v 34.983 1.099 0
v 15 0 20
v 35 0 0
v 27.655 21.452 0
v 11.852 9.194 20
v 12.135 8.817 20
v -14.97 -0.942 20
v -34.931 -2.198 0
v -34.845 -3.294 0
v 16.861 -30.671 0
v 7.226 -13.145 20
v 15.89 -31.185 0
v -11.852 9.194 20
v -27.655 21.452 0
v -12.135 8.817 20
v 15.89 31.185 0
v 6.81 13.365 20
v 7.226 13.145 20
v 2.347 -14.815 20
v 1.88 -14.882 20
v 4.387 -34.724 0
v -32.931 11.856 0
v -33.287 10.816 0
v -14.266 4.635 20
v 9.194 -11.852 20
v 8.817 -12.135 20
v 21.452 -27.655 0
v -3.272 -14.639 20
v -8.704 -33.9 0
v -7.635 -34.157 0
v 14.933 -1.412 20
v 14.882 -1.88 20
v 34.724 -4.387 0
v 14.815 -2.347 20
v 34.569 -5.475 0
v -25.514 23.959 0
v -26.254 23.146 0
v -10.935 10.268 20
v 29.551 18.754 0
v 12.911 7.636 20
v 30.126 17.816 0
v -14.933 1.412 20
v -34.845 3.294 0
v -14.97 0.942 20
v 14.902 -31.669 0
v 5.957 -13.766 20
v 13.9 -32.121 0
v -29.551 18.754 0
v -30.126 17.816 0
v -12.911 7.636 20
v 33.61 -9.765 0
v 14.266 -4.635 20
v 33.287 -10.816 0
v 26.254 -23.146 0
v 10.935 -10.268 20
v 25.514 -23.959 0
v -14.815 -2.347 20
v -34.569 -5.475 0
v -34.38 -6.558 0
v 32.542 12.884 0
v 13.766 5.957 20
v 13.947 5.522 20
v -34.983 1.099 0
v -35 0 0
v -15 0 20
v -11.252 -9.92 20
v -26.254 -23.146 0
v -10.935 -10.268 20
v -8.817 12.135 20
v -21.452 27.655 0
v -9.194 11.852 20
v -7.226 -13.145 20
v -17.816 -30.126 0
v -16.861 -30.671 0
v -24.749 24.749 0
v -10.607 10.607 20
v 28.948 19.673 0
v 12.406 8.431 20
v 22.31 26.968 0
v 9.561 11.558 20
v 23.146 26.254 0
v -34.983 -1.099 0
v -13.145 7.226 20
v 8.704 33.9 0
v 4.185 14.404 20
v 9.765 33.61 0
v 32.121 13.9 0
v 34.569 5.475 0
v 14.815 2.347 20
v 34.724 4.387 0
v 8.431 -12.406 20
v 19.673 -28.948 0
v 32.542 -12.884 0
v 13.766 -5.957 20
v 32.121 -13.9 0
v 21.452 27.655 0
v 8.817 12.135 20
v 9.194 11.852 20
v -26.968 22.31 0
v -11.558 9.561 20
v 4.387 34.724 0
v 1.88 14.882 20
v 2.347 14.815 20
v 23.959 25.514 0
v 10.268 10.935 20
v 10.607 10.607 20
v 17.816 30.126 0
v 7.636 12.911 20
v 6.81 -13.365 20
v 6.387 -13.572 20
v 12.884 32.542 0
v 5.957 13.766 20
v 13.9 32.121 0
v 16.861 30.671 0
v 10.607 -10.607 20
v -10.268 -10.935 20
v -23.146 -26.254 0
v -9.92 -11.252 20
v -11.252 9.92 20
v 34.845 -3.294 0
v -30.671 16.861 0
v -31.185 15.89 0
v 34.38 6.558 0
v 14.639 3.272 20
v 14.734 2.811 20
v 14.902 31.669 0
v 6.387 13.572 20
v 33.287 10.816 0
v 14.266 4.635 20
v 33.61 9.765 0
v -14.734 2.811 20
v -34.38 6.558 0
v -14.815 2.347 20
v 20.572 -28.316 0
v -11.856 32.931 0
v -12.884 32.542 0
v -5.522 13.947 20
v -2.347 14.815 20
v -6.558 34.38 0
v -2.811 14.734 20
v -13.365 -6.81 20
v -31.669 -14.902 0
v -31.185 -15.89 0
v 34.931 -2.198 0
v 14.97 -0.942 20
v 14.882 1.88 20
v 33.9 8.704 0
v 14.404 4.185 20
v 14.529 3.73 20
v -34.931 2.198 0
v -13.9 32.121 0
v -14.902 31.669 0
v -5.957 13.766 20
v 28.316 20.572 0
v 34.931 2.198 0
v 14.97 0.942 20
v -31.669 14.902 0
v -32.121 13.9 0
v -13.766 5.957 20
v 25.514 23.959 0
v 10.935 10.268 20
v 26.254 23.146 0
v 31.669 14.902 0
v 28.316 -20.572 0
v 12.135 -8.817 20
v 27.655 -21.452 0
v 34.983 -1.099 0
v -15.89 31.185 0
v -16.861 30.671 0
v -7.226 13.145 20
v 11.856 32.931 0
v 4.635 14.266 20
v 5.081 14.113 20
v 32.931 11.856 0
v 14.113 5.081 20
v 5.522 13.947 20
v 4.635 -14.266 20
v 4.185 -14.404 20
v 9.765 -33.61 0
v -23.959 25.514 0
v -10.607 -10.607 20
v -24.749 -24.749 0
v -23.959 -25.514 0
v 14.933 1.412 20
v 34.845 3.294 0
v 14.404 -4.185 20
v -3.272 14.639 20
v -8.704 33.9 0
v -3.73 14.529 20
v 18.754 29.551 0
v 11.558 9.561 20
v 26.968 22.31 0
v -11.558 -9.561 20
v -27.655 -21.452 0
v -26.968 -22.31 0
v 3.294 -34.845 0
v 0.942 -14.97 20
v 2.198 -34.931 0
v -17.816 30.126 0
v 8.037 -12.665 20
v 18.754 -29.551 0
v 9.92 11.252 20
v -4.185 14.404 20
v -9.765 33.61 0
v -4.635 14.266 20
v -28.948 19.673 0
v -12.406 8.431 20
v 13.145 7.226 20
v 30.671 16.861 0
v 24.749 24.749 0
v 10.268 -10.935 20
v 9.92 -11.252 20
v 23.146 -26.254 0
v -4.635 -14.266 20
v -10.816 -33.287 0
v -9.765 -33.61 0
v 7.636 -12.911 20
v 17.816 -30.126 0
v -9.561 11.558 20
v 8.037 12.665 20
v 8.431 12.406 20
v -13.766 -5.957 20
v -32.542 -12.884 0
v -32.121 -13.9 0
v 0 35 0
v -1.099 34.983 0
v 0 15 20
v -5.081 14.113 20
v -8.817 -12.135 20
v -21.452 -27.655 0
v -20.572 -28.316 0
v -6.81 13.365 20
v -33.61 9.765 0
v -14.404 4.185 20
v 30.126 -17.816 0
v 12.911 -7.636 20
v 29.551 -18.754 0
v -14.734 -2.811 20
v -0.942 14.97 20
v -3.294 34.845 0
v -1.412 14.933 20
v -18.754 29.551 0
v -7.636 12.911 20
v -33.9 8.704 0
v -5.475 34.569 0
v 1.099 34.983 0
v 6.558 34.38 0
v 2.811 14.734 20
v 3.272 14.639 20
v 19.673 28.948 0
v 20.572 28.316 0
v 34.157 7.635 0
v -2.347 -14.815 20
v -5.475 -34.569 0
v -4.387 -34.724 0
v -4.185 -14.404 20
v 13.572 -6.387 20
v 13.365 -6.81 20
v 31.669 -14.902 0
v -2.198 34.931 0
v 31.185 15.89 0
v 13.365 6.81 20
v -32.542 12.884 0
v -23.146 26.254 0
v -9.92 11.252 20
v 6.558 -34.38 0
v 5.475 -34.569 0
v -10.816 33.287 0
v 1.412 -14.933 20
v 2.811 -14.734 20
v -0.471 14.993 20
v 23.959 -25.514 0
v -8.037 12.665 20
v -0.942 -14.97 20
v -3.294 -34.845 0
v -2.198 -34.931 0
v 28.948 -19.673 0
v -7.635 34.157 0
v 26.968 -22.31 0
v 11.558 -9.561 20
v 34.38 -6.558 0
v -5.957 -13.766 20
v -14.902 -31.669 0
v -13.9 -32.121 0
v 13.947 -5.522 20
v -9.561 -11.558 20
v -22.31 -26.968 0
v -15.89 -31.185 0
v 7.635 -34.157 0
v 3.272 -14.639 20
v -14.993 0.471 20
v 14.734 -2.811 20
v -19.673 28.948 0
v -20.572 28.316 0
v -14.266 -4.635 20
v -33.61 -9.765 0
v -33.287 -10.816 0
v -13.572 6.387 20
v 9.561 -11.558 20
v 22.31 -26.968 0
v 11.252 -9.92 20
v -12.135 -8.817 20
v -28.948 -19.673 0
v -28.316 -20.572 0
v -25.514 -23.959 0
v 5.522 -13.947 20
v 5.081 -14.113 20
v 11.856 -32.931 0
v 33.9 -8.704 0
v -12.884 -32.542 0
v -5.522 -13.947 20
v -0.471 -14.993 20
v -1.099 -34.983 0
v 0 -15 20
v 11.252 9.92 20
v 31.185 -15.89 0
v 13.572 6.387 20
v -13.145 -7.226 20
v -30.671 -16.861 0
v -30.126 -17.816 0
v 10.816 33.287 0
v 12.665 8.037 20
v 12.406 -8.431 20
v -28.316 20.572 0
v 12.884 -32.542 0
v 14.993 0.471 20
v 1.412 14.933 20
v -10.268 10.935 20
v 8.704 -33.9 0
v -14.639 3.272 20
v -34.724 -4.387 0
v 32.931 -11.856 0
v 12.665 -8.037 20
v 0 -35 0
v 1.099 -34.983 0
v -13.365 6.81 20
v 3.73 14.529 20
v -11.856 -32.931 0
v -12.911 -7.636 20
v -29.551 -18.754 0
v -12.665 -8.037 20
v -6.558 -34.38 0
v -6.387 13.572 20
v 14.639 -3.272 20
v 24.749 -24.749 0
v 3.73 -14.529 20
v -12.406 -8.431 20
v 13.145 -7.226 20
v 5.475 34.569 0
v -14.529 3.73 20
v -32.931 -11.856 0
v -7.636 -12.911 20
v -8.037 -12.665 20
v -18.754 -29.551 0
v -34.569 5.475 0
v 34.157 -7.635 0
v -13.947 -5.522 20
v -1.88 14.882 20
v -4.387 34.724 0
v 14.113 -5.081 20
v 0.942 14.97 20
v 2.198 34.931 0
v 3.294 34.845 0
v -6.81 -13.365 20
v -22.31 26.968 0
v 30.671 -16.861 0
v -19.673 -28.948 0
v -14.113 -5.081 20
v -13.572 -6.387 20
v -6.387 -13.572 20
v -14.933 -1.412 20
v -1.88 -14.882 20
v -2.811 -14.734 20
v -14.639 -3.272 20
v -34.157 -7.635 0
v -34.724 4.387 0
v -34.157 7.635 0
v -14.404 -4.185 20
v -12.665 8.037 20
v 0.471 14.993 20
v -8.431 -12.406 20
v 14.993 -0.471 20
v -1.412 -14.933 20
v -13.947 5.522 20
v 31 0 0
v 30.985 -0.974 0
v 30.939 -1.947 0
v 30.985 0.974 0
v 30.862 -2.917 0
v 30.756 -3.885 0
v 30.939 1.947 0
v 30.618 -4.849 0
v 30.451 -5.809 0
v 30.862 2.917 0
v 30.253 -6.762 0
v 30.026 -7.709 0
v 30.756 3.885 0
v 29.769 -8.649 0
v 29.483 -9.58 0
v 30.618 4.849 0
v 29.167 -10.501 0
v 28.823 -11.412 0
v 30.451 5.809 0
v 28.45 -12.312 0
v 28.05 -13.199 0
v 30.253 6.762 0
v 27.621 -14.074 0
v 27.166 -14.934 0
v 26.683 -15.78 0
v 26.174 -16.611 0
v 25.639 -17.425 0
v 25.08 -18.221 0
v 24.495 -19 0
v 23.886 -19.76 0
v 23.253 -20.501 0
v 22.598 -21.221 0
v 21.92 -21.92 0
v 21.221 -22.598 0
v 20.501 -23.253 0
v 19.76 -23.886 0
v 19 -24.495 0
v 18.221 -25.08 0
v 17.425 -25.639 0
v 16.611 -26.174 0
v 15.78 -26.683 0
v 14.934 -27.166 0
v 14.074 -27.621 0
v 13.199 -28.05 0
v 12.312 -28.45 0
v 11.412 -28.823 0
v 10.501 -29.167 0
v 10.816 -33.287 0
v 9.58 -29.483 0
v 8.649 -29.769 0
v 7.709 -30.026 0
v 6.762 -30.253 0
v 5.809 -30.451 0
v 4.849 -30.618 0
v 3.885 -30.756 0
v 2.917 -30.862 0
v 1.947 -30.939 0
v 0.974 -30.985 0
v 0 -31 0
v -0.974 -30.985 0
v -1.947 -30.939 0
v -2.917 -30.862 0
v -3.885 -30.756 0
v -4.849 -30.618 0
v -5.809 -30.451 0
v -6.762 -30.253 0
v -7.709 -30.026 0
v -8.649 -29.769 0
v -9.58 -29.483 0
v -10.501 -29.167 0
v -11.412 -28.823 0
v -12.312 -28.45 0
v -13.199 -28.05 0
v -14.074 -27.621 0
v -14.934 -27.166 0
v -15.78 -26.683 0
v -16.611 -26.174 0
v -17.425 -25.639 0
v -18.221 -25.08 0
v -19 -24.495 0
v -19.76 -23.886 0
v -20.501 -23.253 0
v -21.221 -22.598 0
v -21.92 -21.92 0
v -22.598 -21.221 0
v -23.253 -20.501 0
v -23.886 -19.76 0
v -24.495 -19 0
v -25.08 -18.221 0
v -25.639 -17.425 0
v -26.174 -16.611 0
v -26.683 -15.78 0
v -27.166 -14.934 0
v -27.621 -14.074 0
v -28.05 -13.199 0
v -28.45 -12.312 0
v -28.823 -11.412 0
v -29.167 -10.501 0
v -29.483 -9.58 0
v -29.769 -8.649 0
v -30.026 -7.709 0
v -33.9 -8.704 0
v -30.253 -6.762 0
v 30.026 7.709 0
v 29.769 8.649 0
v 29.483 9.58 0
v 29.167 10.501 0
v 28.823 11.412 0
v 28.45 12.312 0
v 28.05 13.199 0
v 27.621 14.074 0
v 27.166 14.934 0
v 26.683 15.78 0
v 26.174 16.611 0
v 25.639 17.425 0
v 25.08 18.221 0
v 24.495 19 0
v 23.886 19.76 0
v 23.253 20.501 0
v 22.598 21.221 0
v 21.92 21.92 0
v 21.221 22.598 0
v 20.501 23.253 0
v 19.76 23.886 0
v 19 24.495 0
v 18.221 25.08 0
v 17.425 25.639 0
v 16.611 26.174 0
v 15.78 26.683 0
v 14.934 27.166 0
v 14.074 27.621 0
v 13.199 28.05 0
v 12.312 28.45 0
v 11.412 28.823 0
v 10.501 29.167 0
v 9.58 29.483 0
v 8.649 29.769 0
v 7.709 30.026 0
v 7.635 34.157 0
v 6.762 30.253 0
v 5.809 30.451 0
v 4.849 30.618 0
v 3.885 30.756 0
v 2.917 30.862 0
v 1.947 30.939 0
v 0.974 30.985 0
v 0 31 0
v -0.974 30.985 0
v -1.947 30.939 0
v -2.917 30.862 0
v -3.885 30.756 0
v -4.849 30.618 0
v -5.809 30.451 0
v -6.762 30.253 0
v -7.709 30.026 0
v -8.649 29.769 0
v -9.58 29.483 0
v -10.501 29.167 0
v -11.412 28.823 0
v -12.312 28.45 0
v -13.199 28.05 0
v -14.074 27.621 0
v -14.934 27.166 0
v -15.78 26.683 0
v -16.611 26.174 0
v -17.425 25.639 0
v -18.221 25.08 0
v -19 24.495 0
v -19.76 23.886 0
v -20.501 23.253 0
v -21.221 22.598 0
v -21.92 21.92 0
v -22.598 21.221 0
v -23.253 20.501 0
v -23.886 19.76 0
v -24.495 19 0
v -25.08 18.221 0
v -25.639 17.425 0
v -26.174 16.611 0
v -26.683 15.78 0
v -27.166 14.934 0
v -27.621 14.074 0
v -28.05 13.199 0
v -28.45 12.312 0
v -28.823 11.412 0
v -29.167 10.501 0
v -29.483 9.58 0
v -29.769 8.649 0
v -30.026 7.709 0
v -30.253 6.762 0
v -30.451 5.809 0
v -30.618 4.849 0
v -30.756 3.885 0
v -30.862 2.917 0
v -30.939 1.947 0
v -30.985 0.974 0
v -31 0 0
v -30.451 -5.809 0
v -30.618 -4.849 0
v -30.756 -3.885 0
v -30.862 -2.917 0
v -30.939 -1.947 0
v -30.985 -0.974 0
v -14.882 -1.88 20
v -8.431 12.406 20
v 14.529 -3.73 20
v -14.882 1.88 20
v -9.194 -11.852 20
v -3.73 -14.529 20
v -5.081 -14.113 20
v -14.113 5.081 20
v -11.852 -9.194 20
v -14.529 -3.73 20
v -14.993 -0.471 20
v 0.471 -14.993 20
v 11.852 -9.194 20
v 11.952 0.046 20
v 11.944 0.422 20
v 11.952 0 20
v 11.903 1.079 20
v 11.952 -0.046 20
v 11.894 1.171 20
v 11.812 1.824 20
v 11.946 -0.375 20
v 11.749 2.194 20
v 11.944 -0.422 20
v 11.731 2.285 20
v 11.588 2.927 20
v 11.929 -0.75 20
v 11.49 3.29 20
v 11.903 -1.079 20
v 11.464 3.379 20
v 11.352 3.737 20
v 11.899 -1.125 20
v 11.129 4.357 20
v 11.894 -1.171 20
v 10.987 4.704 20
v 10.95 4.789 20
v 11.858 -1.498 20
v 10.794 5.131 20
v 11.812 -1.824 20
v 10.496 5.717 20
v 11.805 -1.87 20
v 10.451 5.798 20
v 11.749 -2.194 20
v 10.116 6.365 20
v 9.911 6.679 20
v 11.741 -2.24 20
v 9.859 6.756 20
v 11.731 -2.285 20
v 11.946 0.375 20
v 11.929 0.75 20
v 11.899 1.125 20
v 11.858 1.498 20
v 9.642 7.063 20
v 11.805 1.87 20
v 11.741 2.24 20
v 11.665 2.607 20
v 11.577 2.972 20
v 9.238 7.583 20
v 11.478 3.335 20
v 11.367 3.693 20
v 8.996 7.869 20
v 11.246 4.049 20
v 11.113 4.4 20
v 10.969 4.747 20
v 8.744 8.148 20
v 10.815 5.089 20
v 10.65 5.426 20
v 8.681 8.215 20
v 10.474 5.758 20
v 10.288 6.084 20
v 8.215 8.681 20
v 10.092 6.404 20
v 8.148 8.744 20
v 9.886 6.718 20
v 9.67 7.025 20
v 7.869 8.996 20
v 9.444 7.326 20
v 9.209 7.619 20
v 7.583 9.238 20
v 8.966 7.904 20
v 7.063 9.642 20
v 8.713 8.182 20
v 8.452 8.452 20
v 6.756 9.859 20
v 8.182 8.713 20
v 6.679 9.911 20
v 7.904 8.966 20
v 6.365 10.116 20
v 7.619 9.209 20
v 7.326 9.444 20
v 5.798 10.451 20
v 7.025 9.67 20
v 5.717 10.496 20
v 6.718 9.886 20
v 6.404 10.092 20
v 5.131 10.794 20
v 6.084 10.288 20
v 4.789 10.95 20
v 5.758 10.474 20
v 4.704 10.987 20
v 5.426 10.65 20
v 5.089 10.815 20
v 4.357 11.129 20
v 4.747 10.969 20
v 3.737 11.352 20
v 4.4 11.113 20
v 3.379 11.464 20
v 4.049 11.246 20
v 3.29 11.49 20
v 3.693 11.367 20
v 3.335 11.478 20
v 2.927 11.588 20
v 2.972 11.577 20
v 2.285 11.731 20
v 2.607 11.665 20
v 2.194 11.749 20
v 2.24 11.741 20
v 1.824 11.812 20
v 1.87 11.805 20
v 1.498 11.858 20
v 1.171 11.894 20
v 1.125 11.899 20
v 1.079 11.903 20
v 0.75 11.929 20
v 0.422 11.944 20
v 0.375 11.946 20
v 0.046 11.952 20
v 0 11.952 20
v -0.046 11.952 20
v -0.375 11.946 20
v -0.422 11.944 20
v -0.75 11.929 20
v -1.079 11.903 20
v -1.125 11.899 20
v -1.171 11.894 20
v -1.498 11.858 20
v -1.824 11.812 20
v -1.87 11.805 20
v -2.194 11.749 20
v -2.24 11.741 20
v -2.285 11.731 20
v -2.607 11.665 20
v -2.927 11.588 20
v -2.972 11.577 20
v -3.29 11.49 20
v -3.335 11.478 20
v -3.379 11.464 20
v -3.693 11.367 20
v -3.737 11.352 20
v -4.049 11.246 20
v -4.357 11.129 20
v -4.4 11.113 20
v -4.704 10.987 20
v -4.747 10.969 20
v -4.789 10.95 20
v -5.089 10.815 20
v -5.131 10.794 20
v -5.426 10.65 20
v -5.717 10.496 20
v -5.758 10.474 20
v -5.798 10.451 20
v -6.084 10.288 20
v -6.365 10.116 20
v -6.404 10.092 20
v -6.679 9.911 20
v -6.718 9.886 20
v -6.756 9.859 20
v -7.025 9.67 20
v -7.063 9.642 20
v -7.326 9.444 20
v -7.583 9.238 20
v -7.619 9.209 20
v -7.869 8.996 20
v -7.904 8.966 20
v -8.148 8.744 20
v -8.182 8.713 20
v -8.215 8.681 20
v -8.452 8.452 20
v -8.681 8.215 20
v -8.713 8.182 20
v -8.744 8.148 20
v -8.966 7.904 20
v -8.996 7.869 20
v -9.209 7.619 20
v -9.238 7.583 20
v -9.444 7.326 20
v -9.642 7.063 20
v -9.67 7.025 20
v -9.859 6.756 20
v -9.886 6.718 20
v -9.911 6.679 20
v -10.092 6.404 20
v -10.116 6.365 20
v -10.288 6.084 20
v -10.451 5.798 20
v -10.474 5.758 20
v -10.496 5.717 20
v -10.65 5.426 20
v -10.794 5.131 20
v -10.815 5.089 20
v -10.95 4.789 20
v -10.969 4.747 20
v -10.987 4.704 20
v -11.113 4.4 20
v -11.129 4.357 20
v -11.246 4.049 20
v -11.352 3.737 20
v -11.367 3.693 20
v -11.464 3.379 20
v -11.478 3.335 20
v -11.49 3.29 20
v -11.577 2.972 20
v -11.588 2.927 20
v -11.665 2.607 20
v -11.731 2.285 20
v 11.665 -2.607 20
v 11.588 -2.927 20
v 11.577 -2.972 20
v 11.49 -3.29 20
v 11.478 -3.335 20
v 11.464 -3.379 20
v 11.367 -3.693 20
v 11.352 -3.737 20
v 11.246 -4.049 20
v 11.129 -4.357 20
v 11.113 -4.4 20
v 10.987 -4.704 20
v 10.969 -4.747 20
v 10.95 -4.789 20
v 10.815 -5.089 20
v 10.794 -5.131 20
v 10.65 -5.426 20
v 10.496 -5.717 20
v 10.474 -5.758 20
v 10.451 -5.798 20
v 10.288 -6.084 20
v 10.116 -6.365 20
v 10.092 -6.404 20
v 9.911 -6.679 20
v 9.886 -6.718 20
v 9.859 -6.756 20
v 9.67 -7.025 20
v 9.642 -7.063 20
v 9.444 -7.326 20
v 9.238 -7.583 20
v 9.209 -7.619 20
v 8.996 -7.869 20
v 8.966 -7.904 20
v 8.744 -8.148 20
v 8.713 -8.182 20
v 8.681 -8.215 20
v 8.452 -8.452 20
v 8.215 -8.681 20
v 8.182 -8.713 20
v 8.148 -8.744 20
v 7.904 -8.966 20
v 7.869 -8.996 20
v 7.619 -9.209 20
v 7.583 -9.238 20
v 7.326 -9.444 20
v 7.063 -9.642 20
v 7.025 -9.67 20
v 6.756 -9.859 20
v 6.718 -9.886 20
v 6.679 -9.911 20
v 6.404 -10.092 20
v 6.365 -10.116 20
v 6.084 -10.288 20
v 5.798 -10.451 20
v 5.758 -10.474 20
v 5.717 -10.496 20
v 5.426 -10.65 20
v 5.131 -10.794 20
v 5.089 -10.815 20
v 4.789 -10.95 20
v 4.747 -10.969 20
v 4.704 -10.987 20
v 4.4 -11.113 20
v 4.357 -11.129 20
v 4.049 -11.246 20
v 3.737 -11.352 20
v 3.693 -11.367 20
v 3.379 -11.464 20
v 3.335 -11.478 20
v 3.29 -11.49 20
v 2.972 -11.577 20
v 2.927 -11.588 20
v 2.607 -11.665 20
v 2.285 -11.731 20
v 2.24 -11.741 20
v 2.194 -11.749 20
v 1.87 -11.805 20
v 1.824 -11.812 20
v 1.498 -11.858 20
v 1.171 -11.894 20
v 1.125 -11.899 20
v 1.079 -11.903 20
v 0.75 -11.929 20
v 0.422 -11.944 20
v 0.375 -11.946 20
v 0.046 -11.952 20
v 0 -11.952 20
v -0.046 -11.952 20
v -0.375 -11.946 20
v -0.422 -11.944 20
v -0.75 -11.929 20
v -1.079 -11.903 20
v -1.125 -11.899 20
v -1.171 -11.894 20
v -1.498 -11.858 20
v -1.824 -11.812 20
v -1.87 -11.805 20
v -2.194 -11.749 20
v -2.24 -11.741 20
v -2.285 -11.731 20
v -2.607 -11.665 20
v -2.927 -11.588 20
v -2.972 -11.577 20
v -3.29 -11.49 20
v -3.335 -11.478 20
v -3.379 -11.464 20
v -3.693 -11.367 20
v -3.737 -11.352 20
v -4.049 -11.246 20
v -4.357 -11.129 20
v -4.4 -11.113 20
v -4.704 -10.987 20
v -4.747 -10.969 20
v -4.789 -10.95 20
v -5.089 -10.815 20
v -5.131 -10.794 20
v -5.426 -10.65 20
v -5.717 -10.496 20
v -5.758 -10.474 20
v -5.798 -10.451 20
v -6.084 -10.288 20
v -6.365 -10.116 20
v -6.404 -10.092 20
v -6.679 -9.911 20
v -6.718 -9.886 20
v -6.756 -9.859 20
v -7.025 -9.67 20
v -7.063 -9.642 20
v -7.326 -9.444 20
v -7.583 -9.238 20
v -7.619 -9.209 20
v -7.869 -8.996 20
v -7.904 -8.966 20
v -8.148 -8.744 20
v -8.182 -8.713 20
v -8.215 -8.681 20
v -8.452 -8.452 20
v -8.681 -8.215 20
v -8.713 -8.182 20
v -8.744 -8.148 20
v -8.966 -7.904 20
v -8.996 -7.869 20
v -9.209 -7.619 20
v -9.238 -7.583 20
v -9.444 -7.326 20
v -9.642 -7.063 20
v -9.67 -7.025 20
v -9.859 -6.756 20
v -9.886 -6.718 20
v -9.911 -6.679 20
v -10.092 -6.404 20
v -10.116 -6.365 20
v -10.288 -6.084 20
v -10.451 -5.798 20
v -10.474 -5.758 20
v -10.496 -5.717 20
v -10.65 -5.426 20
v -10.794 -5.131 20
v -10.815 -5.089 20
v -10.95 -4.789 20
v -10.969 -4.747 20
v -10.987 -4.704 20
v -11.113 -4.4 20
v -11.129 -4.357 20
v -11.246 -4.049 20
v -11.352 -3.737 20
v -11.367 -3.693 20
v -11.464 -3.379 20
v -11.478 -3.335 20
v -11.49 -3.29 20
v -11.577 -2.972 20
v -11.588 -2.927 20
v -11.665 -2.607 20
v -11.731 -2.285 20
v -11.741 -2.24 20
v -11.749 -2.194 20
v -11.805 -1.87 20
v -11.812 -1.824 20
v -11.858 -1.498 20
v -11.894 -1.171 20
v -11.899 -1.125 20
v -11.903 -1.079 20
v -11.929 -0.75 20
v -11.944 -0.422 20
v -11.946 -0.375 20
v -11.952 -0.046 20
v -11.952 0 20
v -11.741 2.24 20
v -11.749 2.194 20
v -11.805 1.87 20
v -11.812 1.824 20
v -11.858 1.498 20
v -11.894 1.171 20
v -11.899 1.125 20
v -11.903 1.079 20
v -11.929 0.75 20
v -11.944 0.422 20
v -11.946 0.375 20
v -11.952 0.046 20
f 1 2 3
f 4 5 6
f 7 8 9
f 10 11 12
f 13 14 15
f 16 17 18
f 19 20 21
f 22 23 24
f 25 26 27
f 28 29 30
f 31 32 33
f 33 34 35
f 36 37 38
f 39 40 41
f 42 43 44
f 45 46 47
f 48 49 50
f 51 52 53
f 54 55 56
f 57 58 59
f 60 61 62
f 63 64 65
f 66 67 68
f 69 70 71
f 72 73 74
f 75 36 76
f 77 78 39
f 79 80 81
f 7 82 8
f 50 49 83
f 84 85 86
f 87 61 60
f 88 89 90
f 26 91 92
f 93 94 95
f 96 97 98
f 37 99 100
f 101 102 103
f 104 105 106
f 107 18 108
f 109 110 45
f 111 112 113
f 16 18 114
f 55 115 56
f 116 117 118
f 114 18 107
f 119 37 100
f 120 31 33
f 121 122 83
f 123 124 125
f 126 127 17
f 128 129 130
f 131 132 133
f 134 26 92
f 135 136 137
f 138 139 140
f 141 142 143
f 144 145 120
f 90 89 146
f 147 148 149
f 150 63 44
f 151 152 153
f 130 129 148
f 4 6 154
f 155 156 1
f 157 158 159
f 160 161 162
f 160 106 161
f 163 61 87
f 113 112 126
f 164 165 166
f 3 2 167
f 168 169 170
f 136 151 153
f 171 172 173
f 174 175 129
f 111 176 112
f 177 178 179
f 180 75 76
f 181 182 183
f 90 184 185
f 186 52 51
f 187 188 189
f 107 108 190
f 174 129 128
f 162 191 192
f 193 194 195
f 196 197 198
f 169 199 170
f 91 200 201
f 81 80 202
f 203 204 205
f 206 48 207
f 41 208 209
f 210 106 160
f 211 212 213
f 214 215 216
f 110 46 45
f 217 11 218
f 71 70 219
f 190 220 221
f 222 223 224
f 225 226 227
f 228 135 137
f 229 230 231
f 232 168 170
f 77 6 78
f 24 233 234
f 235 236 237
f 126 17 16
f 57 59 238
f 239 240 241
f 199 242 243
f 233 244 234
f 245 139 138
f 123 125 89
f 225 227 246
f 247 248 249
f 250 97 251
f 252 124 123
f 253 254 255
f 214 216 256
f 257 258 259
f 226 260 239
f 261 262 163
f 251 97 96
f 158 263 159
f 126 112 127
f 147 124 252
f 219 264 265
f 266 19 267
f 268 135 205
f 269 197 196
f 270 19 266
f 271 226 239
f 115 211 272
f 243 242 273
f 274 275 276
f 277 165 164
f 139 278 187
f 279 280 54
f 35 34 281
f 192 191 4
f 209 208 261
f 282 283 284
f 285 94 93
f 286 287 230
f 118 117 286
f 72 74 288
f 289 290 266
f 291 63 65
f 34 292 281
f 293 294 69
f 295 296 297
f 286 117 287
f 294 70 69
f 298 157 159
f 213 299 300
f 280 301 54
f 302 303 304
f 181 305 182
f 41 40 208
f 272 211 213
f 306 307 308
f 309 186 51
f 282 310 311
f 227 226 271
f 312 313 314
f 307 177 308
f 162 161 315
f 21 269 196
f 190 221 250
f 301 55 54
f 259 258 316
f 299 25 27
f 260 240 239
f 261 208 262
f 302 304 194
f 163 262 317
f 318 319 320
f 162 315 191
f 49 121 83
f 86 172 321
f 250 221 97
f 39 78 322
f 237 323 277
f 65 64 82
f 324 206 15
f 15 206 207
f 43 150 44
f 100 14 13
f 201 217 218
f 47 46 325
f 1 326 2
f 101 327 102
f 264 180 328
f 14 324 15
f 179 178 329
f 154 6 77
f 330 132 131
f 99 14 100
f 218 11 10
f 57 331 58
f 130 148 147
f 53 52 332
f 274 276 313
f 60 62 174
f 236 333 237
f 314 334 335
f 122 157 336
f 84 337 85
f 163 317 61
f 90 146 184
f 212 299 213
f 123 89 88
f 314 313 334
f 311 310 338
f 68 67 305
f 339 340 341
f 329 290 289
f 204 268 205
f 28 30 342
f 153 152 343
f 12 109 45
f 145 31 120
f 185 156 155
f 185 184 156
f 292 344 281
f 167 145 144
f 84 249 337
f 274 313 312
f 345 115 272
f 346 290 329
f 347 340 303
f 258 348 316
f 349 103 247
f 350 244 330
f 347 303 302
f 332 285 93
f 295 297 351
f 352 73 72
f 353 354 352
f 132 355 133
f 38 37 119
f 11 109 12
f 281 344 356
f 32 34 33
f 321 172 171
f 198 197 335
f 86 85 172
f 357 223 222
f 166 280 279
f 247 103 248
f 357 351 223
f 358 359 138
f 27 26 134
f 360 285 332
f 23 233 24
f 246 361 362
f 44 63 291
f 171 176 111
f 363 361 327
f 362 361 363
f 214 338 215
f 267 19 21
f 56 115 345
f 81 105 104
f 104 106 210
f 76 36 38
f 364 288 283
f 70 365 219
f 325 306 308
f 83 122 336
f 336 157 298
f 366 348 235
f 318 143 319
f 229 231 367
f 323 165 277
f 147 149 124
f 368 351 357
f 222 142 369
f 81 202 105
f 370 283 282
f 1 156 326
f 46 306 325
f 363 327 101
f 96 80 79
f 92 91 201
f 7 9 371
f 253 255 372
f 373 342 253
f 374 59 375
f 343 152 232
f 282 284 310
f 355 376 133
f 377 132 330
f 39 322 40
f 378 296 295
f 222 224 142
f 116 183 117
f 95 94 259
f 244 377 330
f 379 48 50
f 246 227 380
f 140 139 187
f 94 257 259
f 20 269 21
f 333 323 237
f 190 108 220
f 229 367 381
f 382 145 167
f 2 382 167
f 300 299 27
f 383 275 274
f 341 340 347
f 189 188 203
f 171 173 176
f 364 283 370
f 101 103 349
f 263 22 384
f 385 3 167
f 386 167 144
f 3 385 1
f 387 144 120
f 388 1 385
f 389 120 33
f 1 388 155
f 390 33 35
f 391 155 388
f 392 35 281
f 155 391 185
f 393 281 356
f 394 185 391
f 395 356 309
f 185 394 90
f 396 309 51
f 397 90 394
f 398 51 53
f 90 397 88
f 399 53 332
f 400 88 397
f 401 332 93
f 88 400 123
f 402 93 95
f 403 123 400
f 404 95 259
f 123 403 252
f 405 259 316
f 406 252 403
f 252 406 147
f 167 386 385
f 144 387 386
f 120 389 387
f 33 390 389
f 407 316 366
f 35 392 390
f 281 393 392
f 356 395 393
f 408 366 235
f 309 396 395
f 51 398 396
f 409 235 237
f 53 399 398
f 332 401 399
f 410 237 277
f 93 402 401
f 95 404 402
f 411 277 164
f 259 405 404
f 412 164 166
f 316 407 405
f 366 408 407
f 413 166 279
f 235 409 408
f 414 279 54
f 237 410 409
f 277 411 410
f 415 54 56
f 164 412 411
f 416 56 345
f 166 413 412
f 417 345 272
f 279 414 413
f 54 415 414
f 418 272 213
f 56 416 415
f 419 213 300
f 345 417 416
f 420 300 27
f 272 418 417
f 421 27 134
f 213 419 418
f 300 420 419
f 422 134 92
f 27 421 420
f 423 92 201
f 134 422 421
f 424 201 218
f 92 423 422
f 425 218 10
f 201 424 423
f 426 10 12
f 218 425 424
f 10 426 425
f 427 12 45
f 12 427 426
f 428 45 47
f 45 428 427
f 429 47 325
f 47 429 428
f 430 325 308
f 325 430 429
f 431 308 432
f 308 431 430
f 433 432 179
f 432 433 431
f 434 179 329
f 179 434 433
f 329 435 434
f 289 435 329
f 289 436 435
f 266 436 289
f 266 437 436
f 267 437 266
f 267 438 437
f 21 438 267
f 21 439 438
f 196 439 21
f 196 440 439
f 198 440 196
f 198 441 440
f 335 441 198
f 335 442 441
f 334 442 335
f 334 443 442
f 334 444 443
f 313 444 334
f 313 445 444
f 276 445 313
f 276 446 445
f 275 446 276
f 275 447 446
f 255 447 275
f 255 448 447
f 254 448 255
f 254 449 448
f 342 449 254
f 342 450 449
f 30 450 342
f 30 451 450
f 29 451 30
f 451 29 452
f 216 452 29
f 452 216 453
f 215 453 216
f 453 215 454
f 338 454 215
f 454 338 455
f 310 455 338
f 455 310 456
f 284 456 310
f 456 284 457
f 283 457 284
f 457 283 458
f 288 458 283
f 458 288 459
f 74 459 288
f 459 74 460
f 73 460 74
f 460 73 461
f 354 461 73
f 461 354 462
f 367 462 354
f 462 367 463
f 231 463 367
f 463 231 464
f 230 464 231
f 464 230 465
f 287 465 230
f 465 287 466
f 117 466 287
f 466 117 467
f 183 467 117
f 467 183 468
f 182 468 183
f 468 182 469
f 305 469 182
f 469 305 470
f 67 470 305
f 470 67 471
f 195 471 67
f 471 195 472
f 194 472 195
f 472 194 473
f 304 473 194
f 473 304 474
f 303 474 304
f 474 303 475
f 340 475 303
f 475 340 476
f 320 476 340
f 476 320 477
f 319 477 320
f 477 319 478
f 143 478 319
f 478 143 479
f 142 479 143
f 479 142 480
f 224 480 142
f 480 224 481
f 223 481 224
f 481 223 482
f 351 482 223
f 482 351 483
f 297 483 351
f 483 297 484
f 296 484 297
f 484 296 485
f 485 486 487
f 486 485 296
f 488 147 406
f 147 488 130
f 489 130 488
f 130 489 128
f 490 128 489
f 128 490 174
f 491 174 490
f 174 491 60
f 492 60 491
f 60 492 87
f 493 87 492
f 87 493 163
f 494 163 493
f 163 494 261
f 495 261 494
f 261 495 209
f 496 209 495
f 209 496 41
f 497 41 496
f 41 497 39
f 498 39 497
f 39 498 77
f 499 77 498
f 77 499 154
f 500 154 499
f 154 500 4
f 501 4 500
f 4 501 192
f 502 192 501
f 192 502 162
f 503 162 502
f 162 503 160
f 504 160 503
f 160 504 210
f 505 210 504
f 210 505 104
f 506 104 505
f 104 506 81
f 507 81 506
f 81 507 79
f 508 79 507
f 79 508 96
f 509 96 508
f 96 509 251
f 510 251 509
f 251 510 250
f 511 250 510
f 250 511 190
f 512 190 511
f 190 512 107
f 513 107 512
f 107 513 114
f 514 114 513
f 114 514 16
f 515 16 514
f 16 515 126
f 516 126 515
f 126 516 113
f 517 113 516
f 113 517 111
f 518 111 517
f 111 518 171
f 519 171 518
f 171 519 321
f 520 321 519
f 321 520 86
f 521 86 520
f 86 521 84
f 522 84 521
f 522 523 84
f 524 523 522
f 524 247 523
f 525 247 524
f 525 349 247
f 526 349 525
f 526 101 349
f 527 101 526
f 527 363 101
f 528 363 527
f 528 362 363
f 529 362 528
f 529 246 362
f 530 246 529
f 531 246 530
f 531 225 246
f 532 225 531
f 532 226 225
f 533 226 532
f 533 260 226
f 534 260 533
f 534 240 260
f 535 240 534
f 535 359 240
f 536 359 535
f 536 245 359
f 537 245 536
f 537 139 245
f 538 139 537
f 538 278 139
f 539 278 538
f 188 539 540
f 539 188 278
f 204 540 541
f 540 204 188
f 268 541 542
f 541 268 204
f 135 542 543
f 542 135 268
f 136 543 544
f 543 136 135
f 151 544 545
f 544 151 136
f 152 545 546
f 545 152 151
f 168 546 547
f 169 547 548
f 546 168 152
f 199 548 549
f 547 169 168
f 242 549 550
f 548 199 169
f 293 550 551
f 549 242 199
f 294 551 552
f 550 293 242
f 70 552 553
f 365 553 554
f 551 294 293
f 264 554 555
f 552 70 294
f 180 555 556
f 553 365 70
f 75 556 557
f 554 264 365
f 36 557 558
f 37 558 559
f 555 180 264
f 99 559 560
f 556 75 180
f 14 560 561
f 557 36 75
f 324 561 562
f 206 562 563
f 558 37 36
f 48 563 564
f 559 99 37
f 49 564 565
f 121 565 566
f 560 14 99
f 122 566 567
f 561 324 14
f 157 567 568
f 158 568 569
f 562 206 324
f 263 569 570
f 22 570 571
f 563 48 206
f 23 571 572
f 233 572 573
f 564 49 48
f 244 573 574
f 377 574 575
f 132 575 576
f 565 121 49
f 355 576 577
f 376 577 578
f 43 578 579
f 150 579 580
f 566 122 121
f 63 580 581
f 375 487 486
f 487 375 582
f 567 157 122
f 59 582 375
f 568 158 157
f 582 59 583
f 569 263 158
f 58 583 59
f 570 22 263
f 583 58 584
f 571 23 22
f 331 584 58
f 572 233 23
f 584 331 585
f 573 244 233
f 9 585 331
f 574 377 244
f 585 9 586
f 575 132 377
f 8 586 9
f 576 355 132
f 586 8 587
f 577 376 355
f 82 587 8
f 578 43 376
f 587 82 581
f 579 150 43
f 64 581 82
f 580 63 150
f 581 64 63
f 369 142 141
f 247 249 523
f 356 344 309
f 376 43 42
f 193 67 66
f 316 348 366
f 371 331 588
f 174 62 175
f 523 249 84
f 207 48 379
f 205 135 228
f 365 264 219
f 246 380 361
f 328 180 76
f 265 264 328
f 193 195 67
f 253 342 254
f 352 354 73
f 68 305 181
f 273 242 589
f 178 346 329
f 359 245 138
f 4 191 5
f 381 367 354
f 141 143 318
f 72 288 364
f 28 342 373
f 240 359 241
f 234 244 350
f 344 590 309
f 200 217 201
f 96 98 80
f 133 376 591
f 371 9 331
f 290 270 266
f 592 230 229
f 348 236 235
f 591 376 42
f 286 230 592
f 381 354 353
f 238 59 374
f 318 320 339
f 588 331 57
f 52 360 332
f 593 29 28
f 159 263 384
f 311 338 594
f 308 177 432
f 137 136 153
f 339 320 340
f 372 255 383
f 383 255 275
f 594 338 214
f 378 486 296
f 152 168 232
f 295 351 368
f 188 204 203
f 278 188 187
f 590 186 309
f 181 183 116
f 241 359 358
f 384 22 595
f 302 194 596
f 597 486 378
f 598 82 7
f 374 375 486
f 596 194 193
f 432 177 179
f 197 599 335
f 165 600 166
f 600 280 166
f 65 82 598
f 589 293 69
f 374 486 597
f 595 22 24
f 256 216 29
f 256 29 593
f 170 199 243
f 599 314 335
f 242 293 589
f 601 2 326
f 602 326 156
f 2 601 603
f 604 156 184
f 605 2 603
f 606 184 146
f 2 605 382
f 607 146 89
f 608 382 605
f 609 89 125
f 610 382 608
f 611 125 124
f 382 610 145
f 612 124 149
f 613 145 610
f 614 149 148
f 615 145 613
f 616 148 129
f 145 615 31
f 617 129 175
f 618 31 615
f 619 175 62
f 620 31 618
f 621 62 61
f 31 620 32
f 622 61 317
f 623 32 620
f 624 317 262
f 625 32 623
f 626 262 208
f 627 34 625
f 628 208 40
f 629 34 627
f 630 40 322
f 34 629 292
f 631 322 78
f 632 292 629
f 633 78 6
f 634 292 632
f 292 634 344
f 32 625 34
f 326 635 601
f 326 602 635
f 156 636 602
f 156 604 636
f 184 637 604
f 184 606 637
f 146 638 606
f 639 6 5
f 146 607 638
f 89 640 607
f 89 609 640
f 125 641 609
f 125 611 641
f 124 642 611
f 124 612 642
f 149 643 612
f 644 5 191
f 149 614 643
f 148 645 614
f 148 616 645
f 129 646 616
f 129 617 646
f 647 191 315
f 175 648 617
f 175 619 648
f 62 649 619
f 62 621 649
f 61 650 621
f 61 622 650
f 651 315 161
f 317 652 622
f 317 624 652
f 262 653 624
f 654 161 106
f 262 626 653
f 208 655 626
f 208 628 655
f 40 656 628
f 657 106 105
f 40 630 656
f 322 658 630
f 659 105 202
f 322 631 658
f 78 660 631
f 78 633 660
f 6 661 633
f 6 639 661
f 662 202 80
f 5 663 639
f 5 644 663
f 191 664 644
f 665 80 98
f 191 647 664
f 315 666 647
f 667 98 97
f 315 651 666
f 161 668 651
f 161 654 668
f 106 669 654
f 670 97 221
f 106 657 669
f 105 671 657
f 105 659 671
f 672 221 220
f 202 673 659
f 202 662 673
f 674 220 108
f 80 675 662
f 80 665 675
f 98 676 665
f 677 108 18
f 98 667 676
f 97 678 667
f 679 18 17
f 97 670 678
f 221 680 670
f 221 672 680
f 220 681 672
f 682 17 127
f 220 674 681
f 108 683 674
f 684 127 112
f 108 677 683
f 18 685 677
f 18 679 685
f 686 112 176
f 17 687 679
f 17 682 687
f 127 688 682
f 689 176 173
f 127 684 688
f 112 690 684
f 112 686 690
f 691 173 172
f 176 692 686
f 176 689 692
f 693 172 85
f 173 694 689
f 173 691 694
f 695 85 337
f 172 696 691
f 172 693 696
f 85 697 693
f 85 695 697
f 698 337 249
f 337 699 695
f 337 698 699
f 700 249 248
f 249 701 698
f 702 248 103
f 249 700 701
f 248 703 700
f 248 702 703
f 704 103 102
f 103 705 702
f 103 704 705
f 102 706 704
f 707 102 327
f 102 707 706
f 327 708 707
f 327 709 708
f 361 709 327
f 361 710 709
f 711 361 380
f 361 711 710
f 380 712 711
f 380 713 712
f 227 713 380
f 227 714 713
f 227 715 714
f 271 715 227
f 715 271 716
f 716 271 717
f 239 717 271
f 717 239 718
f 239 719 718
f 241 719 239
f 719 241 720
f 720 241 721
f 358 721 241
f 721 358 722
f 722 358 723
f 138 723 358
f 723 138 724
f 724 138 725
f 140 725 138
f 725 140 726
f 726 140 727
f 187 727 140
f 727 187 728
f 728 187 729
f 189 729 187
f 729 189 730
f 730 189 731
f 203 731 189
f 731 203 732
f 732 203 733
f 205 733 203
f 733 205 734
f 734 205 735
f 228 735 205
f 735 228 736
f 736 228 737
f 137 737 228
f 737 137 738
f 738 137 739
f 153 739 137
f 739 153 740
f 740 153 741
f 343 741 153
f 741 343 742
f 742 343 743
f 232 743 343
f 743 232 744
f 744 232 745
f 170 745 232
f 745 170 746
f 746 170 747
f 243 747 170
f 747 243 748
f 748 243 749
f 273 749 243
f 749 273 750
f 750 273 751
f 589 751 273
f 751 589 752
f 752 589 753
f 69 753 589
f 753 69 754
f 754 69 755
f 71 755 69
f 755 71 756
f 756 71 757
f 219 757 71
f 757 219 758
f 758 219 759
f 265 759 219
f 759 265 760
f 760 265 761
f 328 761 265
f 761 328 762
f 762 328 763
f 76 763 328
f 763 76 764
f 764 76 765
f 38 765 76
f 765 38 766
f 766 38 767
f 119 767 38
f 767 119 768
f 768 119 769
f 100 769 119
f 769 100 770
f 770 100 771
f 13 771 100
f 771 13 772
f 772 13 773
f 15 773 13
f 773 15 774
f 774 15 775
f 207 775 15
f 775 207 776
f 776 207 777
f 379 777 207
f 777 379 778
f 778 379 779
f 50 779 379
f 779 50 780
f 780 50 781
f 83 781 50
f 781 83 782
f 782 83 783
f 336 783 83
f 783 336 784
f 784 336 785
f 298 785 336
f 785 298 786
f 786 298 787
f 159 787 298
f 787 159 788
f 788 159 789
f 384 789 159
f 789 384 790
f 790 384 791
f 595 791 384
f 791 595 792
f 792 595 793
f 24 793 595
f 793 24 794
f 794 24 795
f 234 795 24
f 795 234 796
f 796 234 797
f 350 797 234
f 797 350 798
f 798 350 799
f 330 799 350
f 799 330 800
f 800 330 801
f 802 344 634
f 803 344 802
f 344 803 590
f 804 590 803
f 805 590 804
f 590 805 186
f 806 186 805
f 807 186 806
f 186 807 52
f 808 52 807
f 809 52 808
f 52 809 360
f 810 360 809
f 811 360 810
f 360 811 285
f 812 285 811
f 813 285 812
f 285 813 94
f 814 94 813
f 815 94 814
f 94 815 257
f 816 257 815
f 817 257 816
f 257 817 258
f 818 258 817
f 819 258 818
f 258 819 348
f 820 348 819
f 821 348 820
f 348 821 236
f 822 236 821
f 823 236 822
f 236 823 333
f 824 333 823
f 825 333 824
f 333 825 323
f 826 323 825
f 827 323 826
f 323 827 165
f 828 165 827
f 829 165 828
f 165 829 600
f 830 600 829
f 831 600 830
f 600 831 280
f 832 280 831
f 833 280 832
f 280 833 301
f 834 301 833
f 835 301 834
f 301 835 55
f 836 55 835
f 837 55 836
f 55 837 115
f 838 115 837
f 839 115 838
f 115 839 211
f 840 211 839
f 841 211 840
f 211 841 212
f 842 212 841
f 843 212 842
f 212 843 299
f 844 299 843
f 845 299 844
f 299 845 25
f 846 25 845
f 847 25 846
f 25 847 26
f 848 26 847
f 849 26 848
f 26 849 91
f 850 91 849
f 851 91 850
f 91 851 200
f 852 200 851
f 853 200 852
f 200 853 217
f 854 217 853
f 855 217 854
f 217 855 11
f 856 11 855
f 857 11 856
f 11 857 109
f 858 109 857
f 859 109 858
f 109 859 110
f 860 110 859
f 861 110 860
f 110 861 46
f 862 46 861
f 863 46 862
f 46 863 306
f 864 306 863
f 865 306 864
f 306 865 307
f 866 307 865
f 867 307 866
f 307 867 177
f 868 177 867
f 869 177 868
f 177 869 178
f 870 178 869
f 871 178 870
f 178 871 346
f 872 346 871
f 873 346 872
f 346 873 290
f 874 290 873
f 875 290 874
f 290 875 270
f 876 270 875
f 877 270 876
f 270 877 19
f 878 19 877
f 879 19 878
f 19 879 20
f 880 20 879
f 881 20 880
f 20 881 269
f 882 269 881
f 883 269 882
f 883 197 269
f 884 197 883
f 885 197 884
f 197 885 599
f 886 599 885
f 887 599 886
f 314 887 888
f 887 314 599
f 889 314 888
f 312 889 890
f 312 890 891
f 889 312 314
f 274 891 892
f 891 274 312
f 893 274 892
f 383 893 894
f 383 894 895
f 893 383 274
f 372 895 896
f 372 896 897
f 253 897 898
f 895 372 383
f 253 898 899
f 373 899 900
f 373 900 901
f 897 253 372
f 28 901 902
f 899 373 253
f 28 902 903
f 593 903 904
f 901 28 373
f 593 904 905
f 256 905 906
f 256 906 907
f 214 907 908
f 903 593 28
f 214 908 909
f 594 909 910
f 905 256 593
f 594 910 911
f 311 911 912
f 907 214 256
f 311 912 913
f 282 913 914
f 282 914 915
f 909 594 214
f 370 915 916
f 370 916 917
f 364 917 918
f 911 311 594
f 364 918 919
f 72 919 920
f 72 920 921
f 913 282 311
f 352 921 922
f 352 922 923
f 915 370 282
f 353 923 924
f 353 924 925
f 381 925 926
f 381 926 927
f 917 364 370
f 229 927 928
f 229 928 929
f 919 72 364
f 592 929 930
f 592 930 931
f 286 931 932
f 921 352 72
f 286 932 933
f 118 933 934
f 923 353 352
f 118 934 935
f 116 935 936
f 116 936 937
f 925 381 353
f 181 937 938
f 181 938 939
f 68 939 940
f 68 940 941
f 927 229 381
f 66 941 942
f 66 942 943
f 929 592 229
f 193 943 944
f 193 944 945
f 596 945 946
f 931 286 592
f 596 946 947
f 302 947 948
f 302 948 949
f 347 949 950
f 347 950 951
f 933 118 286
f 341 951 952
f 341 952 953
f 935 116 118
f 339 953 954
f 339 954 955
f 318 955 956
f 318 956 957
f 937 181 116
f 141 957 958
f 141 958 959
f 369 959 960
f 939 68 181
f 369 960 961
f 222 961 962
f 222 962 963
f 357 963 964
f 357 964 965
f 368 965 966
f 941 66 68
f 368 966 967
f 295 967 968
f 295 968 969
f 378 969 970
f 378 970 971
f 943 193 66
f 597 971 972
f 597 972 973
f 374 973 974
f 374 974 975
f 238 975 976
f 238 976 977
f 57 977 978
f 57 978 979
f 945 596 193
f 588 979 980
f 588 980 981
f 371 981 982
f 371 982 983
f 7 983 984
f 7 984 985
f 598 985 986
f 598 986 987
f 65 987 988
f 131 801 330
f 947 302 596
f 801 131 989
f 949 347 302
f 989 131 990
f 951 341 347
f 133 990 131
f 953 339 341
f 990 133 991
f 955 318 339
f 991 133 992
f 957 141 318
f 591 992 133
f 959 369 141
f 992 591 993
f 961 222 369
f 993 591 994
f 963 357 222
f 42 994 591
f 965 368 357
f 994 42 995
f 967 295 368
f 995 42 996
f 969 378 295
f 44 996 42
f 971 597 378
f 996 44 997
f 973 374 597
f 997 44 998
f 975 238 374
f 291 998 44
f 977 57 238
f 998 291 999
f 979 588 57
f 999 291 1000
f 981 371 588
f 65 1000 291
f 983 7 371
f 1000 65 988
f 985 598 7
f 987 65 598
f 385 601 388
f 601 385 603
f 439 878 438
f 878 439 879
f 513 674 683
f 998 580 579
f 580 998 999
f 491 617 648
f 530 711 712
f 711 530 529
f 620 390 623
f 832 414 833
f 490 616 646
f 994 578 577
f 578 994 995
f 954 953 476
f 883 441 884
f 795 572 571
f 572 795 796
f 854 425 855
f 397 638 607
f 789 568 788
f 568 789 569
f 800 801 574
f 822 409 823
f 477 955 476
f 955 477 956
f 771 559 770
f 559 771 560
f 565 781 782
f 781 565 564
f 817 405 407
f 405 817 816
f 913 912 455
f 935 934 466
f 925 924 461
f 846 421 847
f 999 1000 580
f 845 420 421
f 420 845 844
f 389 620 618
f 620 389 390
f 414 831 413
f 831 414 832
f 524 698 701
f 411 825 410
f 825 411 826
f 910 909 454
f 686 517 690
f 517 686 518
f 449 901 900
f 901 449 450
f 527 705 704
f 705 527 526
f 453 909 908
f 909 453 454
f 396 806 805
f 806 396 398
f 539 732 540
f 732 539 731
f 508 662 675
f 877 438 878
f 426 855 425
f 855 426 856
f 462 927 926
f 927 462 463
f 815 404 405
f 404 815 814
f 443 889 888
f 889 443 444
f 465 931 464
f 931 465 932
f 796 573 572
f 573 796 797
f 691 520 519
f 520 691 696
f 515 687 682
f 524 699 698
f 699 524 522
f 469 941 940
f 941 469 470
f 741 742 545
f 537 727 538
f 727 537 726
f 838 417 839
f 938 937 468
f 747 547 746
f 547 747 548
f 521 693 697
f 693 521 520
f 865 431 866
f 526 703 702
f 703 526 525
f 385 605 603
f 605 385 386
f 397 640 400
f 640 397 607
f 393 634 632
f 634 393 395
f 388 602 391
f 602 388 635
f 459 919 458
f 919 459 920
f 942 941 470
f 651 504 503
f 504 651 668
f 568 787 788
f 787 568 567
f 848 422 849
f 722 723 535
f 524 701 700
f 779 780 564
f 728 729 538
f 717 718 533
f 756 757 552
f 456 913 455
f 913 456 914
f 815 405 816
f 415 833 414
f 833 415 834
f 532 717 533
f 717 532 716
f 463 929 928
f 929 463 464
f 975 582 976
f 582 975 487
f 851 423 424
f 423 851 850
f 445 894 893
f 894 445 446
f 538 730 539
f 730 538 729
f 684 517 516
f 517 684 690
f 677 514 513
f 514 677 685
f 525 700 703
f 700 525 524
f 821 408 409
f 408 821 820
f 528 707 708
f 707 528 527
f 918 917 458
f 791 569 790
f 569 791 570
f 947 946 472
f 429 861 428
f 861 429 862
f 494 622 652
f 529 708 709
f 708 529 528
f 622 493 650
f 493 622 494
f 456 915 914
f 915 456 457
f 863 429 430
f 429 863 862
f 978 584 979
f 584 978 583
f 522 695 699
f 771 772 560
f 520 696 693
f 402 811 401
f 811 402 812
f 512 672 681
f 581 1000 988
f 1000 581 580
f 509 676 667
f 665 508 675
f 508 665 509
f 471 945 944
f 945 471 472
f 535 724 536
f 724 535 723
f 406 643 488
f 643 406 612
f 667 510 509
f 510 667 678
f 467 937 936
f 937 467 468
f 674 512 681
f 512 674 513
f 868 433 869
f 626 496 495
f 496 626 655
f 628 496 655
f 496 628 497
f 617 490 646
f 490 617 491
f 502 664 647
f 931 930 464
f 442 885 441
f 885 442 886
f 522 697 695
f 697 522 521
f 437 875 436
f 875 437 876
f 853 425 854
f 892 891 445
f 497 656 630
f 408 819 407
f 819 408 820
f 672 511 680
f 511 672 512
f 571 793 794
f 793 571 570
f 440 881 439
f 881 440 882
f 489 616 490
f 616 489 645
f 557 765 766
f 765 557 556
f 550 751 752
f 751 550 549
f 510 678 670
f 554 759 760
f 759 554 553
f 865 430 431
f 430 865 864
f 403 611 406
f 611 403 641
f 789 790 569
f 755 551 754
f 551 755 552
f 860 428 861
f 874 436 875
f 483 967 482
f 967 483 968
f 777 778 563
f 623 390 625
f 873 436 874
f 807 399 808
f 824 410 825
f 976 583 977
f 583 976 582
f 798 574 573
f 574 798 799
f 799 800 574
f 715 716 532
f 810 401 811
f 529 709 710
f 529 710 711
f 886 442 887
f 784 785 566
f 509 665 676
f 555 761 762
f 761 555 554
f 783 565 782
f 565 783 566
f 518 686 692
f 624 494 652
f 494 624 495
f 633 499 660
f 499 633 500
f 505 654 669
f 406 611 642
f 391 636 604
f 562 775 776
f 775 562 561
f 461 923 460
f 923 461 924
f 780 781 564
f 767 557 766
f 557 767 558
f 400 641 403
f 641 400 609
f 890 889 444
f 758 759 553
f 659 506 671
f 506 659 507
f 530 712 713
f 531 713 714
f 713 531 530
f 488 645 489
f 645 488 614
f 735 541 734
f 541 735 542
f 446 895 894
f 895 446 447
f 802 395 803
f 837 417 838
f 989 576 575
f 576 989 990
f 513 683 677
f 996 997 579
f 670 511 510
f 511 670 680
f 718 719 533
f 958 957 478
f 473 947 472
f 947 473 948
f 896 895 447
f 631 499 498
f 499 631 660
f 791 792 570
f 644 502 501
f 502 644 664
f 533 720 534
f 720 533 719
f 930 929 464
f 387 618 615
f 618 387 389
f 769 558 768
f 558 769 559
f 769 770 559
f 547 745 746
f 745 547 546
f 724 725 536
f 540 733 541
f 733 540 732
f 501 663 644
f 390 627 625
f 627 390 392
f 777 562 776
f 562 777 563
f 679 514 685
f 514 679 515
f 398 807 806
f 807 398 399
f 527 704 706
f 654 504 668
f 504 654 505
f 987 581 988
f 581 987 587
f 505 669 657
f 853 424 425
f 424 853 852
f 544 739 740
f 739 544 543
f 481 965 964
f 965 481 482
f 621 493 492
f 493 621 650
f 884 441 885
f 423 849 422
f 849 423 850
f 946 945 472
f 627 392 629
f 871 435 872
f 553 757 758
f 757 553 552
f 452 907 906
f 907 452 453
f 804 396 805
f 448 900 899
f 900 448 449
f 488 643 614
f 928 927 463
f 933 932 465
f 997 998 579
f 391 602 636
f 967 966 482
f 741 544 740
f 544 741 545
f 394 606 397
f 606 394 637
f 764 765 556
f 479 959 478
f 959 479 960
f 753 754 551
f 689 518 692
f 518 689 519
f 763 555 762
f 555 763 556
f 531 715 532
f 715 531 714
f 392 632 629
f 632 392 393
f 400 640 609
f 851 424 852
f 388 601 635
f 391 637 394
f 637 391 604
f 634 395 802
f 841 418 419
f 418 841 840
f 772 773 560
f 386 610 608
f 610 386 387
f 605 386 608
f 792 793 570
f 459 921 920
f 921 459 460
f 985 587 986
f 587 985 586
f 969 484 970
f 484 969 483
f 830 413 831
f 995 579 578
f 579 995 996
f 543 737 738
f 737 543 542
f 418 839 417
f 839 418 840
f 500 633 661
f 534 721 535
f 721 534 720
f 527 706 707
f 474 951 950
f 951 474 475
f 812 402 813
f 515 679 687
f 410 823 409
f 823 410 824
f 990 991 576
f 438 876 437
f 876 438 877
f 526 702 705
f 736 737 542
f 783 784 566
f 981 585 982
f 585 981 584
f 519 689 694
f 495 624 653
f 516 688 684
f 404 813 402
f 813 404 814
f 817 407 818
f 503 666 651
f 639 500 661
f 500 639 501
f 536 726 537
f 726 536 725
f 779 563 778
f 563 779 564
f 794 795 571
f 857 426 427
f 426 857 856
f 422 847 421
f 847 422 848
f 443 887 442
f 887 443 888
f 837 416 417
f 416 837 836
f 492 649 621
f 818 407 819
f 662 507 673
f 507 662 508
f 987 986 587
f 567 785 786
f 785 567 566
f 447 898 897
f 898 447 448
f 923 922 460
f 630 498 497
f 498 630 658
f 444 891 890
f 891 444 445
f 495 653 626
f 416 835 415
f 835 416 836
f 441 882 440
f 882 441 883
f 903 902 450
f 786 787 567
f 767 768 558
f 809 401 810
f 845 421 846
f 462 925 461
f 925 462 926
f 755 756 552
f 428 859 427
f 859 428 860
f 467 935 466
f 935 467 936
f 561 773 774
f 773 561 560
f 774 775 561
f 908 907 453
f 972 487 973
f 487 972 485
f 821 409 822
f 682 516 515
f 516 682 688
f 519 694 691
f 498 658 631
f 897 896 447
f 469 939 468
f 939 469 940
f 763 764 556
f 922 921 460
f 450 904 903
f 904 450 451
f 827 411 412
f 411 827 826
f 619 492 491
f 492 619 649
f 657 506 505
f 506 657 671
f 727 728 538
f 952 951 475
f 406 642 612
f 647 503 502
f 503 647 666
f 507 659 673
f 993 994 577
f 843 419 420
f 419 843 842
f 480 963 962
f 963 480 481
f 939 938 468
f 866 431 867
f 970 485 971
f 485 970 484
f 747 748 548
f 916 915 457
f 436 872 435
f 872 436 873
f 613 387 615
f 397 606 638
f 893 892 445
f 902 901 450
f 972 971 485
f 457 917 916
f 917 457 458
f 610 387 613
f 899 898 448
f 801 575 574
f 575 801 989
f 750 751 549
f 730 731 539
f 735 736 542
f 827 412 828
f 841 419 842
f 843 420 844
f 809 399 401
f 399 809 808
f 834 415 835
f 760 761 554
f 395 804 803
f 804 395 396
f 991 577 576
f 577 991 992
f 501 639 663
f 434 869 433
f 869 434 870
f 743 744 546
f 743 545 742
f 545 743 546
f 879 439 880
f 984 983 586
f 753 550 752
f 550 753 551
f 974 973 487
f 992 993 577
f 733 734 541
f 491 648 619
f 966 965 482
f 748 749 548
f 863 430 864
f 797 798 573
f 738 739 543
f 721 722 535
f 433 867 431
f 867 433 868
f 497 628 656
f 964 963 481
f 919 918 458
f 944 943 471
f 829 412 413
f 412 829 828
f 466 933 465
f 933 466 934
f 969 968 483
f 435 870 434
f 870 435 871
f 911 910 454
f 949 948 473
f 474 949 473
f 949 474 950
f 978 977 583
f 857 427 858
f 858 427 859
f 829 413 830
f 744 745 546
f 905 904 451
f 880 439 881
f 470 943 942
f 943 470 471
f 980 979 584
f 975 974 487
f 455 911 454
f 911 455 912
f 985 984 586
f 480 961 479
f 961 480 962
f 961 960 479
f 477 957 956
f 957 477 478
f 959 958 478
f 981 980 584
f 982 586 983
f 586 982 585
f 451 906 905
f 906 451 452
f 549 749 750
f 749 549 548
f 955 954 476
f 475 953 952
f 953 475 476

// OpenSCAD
$fn = 200;  // High resolution

// --- Parameters ---
height = 20;
top_radius = 35;
bottom_radius = 15;
wall_thickness = 4;
exit_hole_radius = 6;

// --- Smooth Funnel Taper ---
difference() {
    // Outer curved funnel (from pulse chamber)
    cylinder(h=height, r1=top_radius, r2=bottom_radius);

    // Inner axial flow path
    translate([0, 0, 0])
        cylinder(h=height + 1, r1=top_radius - wall_thickness, r2=bottom_radius - wall_thickness);

    // Exit nozzle hole
    translate([0, 0, -1])
        cylinder(h=height + 2, r=exit_hole_radius);
}
